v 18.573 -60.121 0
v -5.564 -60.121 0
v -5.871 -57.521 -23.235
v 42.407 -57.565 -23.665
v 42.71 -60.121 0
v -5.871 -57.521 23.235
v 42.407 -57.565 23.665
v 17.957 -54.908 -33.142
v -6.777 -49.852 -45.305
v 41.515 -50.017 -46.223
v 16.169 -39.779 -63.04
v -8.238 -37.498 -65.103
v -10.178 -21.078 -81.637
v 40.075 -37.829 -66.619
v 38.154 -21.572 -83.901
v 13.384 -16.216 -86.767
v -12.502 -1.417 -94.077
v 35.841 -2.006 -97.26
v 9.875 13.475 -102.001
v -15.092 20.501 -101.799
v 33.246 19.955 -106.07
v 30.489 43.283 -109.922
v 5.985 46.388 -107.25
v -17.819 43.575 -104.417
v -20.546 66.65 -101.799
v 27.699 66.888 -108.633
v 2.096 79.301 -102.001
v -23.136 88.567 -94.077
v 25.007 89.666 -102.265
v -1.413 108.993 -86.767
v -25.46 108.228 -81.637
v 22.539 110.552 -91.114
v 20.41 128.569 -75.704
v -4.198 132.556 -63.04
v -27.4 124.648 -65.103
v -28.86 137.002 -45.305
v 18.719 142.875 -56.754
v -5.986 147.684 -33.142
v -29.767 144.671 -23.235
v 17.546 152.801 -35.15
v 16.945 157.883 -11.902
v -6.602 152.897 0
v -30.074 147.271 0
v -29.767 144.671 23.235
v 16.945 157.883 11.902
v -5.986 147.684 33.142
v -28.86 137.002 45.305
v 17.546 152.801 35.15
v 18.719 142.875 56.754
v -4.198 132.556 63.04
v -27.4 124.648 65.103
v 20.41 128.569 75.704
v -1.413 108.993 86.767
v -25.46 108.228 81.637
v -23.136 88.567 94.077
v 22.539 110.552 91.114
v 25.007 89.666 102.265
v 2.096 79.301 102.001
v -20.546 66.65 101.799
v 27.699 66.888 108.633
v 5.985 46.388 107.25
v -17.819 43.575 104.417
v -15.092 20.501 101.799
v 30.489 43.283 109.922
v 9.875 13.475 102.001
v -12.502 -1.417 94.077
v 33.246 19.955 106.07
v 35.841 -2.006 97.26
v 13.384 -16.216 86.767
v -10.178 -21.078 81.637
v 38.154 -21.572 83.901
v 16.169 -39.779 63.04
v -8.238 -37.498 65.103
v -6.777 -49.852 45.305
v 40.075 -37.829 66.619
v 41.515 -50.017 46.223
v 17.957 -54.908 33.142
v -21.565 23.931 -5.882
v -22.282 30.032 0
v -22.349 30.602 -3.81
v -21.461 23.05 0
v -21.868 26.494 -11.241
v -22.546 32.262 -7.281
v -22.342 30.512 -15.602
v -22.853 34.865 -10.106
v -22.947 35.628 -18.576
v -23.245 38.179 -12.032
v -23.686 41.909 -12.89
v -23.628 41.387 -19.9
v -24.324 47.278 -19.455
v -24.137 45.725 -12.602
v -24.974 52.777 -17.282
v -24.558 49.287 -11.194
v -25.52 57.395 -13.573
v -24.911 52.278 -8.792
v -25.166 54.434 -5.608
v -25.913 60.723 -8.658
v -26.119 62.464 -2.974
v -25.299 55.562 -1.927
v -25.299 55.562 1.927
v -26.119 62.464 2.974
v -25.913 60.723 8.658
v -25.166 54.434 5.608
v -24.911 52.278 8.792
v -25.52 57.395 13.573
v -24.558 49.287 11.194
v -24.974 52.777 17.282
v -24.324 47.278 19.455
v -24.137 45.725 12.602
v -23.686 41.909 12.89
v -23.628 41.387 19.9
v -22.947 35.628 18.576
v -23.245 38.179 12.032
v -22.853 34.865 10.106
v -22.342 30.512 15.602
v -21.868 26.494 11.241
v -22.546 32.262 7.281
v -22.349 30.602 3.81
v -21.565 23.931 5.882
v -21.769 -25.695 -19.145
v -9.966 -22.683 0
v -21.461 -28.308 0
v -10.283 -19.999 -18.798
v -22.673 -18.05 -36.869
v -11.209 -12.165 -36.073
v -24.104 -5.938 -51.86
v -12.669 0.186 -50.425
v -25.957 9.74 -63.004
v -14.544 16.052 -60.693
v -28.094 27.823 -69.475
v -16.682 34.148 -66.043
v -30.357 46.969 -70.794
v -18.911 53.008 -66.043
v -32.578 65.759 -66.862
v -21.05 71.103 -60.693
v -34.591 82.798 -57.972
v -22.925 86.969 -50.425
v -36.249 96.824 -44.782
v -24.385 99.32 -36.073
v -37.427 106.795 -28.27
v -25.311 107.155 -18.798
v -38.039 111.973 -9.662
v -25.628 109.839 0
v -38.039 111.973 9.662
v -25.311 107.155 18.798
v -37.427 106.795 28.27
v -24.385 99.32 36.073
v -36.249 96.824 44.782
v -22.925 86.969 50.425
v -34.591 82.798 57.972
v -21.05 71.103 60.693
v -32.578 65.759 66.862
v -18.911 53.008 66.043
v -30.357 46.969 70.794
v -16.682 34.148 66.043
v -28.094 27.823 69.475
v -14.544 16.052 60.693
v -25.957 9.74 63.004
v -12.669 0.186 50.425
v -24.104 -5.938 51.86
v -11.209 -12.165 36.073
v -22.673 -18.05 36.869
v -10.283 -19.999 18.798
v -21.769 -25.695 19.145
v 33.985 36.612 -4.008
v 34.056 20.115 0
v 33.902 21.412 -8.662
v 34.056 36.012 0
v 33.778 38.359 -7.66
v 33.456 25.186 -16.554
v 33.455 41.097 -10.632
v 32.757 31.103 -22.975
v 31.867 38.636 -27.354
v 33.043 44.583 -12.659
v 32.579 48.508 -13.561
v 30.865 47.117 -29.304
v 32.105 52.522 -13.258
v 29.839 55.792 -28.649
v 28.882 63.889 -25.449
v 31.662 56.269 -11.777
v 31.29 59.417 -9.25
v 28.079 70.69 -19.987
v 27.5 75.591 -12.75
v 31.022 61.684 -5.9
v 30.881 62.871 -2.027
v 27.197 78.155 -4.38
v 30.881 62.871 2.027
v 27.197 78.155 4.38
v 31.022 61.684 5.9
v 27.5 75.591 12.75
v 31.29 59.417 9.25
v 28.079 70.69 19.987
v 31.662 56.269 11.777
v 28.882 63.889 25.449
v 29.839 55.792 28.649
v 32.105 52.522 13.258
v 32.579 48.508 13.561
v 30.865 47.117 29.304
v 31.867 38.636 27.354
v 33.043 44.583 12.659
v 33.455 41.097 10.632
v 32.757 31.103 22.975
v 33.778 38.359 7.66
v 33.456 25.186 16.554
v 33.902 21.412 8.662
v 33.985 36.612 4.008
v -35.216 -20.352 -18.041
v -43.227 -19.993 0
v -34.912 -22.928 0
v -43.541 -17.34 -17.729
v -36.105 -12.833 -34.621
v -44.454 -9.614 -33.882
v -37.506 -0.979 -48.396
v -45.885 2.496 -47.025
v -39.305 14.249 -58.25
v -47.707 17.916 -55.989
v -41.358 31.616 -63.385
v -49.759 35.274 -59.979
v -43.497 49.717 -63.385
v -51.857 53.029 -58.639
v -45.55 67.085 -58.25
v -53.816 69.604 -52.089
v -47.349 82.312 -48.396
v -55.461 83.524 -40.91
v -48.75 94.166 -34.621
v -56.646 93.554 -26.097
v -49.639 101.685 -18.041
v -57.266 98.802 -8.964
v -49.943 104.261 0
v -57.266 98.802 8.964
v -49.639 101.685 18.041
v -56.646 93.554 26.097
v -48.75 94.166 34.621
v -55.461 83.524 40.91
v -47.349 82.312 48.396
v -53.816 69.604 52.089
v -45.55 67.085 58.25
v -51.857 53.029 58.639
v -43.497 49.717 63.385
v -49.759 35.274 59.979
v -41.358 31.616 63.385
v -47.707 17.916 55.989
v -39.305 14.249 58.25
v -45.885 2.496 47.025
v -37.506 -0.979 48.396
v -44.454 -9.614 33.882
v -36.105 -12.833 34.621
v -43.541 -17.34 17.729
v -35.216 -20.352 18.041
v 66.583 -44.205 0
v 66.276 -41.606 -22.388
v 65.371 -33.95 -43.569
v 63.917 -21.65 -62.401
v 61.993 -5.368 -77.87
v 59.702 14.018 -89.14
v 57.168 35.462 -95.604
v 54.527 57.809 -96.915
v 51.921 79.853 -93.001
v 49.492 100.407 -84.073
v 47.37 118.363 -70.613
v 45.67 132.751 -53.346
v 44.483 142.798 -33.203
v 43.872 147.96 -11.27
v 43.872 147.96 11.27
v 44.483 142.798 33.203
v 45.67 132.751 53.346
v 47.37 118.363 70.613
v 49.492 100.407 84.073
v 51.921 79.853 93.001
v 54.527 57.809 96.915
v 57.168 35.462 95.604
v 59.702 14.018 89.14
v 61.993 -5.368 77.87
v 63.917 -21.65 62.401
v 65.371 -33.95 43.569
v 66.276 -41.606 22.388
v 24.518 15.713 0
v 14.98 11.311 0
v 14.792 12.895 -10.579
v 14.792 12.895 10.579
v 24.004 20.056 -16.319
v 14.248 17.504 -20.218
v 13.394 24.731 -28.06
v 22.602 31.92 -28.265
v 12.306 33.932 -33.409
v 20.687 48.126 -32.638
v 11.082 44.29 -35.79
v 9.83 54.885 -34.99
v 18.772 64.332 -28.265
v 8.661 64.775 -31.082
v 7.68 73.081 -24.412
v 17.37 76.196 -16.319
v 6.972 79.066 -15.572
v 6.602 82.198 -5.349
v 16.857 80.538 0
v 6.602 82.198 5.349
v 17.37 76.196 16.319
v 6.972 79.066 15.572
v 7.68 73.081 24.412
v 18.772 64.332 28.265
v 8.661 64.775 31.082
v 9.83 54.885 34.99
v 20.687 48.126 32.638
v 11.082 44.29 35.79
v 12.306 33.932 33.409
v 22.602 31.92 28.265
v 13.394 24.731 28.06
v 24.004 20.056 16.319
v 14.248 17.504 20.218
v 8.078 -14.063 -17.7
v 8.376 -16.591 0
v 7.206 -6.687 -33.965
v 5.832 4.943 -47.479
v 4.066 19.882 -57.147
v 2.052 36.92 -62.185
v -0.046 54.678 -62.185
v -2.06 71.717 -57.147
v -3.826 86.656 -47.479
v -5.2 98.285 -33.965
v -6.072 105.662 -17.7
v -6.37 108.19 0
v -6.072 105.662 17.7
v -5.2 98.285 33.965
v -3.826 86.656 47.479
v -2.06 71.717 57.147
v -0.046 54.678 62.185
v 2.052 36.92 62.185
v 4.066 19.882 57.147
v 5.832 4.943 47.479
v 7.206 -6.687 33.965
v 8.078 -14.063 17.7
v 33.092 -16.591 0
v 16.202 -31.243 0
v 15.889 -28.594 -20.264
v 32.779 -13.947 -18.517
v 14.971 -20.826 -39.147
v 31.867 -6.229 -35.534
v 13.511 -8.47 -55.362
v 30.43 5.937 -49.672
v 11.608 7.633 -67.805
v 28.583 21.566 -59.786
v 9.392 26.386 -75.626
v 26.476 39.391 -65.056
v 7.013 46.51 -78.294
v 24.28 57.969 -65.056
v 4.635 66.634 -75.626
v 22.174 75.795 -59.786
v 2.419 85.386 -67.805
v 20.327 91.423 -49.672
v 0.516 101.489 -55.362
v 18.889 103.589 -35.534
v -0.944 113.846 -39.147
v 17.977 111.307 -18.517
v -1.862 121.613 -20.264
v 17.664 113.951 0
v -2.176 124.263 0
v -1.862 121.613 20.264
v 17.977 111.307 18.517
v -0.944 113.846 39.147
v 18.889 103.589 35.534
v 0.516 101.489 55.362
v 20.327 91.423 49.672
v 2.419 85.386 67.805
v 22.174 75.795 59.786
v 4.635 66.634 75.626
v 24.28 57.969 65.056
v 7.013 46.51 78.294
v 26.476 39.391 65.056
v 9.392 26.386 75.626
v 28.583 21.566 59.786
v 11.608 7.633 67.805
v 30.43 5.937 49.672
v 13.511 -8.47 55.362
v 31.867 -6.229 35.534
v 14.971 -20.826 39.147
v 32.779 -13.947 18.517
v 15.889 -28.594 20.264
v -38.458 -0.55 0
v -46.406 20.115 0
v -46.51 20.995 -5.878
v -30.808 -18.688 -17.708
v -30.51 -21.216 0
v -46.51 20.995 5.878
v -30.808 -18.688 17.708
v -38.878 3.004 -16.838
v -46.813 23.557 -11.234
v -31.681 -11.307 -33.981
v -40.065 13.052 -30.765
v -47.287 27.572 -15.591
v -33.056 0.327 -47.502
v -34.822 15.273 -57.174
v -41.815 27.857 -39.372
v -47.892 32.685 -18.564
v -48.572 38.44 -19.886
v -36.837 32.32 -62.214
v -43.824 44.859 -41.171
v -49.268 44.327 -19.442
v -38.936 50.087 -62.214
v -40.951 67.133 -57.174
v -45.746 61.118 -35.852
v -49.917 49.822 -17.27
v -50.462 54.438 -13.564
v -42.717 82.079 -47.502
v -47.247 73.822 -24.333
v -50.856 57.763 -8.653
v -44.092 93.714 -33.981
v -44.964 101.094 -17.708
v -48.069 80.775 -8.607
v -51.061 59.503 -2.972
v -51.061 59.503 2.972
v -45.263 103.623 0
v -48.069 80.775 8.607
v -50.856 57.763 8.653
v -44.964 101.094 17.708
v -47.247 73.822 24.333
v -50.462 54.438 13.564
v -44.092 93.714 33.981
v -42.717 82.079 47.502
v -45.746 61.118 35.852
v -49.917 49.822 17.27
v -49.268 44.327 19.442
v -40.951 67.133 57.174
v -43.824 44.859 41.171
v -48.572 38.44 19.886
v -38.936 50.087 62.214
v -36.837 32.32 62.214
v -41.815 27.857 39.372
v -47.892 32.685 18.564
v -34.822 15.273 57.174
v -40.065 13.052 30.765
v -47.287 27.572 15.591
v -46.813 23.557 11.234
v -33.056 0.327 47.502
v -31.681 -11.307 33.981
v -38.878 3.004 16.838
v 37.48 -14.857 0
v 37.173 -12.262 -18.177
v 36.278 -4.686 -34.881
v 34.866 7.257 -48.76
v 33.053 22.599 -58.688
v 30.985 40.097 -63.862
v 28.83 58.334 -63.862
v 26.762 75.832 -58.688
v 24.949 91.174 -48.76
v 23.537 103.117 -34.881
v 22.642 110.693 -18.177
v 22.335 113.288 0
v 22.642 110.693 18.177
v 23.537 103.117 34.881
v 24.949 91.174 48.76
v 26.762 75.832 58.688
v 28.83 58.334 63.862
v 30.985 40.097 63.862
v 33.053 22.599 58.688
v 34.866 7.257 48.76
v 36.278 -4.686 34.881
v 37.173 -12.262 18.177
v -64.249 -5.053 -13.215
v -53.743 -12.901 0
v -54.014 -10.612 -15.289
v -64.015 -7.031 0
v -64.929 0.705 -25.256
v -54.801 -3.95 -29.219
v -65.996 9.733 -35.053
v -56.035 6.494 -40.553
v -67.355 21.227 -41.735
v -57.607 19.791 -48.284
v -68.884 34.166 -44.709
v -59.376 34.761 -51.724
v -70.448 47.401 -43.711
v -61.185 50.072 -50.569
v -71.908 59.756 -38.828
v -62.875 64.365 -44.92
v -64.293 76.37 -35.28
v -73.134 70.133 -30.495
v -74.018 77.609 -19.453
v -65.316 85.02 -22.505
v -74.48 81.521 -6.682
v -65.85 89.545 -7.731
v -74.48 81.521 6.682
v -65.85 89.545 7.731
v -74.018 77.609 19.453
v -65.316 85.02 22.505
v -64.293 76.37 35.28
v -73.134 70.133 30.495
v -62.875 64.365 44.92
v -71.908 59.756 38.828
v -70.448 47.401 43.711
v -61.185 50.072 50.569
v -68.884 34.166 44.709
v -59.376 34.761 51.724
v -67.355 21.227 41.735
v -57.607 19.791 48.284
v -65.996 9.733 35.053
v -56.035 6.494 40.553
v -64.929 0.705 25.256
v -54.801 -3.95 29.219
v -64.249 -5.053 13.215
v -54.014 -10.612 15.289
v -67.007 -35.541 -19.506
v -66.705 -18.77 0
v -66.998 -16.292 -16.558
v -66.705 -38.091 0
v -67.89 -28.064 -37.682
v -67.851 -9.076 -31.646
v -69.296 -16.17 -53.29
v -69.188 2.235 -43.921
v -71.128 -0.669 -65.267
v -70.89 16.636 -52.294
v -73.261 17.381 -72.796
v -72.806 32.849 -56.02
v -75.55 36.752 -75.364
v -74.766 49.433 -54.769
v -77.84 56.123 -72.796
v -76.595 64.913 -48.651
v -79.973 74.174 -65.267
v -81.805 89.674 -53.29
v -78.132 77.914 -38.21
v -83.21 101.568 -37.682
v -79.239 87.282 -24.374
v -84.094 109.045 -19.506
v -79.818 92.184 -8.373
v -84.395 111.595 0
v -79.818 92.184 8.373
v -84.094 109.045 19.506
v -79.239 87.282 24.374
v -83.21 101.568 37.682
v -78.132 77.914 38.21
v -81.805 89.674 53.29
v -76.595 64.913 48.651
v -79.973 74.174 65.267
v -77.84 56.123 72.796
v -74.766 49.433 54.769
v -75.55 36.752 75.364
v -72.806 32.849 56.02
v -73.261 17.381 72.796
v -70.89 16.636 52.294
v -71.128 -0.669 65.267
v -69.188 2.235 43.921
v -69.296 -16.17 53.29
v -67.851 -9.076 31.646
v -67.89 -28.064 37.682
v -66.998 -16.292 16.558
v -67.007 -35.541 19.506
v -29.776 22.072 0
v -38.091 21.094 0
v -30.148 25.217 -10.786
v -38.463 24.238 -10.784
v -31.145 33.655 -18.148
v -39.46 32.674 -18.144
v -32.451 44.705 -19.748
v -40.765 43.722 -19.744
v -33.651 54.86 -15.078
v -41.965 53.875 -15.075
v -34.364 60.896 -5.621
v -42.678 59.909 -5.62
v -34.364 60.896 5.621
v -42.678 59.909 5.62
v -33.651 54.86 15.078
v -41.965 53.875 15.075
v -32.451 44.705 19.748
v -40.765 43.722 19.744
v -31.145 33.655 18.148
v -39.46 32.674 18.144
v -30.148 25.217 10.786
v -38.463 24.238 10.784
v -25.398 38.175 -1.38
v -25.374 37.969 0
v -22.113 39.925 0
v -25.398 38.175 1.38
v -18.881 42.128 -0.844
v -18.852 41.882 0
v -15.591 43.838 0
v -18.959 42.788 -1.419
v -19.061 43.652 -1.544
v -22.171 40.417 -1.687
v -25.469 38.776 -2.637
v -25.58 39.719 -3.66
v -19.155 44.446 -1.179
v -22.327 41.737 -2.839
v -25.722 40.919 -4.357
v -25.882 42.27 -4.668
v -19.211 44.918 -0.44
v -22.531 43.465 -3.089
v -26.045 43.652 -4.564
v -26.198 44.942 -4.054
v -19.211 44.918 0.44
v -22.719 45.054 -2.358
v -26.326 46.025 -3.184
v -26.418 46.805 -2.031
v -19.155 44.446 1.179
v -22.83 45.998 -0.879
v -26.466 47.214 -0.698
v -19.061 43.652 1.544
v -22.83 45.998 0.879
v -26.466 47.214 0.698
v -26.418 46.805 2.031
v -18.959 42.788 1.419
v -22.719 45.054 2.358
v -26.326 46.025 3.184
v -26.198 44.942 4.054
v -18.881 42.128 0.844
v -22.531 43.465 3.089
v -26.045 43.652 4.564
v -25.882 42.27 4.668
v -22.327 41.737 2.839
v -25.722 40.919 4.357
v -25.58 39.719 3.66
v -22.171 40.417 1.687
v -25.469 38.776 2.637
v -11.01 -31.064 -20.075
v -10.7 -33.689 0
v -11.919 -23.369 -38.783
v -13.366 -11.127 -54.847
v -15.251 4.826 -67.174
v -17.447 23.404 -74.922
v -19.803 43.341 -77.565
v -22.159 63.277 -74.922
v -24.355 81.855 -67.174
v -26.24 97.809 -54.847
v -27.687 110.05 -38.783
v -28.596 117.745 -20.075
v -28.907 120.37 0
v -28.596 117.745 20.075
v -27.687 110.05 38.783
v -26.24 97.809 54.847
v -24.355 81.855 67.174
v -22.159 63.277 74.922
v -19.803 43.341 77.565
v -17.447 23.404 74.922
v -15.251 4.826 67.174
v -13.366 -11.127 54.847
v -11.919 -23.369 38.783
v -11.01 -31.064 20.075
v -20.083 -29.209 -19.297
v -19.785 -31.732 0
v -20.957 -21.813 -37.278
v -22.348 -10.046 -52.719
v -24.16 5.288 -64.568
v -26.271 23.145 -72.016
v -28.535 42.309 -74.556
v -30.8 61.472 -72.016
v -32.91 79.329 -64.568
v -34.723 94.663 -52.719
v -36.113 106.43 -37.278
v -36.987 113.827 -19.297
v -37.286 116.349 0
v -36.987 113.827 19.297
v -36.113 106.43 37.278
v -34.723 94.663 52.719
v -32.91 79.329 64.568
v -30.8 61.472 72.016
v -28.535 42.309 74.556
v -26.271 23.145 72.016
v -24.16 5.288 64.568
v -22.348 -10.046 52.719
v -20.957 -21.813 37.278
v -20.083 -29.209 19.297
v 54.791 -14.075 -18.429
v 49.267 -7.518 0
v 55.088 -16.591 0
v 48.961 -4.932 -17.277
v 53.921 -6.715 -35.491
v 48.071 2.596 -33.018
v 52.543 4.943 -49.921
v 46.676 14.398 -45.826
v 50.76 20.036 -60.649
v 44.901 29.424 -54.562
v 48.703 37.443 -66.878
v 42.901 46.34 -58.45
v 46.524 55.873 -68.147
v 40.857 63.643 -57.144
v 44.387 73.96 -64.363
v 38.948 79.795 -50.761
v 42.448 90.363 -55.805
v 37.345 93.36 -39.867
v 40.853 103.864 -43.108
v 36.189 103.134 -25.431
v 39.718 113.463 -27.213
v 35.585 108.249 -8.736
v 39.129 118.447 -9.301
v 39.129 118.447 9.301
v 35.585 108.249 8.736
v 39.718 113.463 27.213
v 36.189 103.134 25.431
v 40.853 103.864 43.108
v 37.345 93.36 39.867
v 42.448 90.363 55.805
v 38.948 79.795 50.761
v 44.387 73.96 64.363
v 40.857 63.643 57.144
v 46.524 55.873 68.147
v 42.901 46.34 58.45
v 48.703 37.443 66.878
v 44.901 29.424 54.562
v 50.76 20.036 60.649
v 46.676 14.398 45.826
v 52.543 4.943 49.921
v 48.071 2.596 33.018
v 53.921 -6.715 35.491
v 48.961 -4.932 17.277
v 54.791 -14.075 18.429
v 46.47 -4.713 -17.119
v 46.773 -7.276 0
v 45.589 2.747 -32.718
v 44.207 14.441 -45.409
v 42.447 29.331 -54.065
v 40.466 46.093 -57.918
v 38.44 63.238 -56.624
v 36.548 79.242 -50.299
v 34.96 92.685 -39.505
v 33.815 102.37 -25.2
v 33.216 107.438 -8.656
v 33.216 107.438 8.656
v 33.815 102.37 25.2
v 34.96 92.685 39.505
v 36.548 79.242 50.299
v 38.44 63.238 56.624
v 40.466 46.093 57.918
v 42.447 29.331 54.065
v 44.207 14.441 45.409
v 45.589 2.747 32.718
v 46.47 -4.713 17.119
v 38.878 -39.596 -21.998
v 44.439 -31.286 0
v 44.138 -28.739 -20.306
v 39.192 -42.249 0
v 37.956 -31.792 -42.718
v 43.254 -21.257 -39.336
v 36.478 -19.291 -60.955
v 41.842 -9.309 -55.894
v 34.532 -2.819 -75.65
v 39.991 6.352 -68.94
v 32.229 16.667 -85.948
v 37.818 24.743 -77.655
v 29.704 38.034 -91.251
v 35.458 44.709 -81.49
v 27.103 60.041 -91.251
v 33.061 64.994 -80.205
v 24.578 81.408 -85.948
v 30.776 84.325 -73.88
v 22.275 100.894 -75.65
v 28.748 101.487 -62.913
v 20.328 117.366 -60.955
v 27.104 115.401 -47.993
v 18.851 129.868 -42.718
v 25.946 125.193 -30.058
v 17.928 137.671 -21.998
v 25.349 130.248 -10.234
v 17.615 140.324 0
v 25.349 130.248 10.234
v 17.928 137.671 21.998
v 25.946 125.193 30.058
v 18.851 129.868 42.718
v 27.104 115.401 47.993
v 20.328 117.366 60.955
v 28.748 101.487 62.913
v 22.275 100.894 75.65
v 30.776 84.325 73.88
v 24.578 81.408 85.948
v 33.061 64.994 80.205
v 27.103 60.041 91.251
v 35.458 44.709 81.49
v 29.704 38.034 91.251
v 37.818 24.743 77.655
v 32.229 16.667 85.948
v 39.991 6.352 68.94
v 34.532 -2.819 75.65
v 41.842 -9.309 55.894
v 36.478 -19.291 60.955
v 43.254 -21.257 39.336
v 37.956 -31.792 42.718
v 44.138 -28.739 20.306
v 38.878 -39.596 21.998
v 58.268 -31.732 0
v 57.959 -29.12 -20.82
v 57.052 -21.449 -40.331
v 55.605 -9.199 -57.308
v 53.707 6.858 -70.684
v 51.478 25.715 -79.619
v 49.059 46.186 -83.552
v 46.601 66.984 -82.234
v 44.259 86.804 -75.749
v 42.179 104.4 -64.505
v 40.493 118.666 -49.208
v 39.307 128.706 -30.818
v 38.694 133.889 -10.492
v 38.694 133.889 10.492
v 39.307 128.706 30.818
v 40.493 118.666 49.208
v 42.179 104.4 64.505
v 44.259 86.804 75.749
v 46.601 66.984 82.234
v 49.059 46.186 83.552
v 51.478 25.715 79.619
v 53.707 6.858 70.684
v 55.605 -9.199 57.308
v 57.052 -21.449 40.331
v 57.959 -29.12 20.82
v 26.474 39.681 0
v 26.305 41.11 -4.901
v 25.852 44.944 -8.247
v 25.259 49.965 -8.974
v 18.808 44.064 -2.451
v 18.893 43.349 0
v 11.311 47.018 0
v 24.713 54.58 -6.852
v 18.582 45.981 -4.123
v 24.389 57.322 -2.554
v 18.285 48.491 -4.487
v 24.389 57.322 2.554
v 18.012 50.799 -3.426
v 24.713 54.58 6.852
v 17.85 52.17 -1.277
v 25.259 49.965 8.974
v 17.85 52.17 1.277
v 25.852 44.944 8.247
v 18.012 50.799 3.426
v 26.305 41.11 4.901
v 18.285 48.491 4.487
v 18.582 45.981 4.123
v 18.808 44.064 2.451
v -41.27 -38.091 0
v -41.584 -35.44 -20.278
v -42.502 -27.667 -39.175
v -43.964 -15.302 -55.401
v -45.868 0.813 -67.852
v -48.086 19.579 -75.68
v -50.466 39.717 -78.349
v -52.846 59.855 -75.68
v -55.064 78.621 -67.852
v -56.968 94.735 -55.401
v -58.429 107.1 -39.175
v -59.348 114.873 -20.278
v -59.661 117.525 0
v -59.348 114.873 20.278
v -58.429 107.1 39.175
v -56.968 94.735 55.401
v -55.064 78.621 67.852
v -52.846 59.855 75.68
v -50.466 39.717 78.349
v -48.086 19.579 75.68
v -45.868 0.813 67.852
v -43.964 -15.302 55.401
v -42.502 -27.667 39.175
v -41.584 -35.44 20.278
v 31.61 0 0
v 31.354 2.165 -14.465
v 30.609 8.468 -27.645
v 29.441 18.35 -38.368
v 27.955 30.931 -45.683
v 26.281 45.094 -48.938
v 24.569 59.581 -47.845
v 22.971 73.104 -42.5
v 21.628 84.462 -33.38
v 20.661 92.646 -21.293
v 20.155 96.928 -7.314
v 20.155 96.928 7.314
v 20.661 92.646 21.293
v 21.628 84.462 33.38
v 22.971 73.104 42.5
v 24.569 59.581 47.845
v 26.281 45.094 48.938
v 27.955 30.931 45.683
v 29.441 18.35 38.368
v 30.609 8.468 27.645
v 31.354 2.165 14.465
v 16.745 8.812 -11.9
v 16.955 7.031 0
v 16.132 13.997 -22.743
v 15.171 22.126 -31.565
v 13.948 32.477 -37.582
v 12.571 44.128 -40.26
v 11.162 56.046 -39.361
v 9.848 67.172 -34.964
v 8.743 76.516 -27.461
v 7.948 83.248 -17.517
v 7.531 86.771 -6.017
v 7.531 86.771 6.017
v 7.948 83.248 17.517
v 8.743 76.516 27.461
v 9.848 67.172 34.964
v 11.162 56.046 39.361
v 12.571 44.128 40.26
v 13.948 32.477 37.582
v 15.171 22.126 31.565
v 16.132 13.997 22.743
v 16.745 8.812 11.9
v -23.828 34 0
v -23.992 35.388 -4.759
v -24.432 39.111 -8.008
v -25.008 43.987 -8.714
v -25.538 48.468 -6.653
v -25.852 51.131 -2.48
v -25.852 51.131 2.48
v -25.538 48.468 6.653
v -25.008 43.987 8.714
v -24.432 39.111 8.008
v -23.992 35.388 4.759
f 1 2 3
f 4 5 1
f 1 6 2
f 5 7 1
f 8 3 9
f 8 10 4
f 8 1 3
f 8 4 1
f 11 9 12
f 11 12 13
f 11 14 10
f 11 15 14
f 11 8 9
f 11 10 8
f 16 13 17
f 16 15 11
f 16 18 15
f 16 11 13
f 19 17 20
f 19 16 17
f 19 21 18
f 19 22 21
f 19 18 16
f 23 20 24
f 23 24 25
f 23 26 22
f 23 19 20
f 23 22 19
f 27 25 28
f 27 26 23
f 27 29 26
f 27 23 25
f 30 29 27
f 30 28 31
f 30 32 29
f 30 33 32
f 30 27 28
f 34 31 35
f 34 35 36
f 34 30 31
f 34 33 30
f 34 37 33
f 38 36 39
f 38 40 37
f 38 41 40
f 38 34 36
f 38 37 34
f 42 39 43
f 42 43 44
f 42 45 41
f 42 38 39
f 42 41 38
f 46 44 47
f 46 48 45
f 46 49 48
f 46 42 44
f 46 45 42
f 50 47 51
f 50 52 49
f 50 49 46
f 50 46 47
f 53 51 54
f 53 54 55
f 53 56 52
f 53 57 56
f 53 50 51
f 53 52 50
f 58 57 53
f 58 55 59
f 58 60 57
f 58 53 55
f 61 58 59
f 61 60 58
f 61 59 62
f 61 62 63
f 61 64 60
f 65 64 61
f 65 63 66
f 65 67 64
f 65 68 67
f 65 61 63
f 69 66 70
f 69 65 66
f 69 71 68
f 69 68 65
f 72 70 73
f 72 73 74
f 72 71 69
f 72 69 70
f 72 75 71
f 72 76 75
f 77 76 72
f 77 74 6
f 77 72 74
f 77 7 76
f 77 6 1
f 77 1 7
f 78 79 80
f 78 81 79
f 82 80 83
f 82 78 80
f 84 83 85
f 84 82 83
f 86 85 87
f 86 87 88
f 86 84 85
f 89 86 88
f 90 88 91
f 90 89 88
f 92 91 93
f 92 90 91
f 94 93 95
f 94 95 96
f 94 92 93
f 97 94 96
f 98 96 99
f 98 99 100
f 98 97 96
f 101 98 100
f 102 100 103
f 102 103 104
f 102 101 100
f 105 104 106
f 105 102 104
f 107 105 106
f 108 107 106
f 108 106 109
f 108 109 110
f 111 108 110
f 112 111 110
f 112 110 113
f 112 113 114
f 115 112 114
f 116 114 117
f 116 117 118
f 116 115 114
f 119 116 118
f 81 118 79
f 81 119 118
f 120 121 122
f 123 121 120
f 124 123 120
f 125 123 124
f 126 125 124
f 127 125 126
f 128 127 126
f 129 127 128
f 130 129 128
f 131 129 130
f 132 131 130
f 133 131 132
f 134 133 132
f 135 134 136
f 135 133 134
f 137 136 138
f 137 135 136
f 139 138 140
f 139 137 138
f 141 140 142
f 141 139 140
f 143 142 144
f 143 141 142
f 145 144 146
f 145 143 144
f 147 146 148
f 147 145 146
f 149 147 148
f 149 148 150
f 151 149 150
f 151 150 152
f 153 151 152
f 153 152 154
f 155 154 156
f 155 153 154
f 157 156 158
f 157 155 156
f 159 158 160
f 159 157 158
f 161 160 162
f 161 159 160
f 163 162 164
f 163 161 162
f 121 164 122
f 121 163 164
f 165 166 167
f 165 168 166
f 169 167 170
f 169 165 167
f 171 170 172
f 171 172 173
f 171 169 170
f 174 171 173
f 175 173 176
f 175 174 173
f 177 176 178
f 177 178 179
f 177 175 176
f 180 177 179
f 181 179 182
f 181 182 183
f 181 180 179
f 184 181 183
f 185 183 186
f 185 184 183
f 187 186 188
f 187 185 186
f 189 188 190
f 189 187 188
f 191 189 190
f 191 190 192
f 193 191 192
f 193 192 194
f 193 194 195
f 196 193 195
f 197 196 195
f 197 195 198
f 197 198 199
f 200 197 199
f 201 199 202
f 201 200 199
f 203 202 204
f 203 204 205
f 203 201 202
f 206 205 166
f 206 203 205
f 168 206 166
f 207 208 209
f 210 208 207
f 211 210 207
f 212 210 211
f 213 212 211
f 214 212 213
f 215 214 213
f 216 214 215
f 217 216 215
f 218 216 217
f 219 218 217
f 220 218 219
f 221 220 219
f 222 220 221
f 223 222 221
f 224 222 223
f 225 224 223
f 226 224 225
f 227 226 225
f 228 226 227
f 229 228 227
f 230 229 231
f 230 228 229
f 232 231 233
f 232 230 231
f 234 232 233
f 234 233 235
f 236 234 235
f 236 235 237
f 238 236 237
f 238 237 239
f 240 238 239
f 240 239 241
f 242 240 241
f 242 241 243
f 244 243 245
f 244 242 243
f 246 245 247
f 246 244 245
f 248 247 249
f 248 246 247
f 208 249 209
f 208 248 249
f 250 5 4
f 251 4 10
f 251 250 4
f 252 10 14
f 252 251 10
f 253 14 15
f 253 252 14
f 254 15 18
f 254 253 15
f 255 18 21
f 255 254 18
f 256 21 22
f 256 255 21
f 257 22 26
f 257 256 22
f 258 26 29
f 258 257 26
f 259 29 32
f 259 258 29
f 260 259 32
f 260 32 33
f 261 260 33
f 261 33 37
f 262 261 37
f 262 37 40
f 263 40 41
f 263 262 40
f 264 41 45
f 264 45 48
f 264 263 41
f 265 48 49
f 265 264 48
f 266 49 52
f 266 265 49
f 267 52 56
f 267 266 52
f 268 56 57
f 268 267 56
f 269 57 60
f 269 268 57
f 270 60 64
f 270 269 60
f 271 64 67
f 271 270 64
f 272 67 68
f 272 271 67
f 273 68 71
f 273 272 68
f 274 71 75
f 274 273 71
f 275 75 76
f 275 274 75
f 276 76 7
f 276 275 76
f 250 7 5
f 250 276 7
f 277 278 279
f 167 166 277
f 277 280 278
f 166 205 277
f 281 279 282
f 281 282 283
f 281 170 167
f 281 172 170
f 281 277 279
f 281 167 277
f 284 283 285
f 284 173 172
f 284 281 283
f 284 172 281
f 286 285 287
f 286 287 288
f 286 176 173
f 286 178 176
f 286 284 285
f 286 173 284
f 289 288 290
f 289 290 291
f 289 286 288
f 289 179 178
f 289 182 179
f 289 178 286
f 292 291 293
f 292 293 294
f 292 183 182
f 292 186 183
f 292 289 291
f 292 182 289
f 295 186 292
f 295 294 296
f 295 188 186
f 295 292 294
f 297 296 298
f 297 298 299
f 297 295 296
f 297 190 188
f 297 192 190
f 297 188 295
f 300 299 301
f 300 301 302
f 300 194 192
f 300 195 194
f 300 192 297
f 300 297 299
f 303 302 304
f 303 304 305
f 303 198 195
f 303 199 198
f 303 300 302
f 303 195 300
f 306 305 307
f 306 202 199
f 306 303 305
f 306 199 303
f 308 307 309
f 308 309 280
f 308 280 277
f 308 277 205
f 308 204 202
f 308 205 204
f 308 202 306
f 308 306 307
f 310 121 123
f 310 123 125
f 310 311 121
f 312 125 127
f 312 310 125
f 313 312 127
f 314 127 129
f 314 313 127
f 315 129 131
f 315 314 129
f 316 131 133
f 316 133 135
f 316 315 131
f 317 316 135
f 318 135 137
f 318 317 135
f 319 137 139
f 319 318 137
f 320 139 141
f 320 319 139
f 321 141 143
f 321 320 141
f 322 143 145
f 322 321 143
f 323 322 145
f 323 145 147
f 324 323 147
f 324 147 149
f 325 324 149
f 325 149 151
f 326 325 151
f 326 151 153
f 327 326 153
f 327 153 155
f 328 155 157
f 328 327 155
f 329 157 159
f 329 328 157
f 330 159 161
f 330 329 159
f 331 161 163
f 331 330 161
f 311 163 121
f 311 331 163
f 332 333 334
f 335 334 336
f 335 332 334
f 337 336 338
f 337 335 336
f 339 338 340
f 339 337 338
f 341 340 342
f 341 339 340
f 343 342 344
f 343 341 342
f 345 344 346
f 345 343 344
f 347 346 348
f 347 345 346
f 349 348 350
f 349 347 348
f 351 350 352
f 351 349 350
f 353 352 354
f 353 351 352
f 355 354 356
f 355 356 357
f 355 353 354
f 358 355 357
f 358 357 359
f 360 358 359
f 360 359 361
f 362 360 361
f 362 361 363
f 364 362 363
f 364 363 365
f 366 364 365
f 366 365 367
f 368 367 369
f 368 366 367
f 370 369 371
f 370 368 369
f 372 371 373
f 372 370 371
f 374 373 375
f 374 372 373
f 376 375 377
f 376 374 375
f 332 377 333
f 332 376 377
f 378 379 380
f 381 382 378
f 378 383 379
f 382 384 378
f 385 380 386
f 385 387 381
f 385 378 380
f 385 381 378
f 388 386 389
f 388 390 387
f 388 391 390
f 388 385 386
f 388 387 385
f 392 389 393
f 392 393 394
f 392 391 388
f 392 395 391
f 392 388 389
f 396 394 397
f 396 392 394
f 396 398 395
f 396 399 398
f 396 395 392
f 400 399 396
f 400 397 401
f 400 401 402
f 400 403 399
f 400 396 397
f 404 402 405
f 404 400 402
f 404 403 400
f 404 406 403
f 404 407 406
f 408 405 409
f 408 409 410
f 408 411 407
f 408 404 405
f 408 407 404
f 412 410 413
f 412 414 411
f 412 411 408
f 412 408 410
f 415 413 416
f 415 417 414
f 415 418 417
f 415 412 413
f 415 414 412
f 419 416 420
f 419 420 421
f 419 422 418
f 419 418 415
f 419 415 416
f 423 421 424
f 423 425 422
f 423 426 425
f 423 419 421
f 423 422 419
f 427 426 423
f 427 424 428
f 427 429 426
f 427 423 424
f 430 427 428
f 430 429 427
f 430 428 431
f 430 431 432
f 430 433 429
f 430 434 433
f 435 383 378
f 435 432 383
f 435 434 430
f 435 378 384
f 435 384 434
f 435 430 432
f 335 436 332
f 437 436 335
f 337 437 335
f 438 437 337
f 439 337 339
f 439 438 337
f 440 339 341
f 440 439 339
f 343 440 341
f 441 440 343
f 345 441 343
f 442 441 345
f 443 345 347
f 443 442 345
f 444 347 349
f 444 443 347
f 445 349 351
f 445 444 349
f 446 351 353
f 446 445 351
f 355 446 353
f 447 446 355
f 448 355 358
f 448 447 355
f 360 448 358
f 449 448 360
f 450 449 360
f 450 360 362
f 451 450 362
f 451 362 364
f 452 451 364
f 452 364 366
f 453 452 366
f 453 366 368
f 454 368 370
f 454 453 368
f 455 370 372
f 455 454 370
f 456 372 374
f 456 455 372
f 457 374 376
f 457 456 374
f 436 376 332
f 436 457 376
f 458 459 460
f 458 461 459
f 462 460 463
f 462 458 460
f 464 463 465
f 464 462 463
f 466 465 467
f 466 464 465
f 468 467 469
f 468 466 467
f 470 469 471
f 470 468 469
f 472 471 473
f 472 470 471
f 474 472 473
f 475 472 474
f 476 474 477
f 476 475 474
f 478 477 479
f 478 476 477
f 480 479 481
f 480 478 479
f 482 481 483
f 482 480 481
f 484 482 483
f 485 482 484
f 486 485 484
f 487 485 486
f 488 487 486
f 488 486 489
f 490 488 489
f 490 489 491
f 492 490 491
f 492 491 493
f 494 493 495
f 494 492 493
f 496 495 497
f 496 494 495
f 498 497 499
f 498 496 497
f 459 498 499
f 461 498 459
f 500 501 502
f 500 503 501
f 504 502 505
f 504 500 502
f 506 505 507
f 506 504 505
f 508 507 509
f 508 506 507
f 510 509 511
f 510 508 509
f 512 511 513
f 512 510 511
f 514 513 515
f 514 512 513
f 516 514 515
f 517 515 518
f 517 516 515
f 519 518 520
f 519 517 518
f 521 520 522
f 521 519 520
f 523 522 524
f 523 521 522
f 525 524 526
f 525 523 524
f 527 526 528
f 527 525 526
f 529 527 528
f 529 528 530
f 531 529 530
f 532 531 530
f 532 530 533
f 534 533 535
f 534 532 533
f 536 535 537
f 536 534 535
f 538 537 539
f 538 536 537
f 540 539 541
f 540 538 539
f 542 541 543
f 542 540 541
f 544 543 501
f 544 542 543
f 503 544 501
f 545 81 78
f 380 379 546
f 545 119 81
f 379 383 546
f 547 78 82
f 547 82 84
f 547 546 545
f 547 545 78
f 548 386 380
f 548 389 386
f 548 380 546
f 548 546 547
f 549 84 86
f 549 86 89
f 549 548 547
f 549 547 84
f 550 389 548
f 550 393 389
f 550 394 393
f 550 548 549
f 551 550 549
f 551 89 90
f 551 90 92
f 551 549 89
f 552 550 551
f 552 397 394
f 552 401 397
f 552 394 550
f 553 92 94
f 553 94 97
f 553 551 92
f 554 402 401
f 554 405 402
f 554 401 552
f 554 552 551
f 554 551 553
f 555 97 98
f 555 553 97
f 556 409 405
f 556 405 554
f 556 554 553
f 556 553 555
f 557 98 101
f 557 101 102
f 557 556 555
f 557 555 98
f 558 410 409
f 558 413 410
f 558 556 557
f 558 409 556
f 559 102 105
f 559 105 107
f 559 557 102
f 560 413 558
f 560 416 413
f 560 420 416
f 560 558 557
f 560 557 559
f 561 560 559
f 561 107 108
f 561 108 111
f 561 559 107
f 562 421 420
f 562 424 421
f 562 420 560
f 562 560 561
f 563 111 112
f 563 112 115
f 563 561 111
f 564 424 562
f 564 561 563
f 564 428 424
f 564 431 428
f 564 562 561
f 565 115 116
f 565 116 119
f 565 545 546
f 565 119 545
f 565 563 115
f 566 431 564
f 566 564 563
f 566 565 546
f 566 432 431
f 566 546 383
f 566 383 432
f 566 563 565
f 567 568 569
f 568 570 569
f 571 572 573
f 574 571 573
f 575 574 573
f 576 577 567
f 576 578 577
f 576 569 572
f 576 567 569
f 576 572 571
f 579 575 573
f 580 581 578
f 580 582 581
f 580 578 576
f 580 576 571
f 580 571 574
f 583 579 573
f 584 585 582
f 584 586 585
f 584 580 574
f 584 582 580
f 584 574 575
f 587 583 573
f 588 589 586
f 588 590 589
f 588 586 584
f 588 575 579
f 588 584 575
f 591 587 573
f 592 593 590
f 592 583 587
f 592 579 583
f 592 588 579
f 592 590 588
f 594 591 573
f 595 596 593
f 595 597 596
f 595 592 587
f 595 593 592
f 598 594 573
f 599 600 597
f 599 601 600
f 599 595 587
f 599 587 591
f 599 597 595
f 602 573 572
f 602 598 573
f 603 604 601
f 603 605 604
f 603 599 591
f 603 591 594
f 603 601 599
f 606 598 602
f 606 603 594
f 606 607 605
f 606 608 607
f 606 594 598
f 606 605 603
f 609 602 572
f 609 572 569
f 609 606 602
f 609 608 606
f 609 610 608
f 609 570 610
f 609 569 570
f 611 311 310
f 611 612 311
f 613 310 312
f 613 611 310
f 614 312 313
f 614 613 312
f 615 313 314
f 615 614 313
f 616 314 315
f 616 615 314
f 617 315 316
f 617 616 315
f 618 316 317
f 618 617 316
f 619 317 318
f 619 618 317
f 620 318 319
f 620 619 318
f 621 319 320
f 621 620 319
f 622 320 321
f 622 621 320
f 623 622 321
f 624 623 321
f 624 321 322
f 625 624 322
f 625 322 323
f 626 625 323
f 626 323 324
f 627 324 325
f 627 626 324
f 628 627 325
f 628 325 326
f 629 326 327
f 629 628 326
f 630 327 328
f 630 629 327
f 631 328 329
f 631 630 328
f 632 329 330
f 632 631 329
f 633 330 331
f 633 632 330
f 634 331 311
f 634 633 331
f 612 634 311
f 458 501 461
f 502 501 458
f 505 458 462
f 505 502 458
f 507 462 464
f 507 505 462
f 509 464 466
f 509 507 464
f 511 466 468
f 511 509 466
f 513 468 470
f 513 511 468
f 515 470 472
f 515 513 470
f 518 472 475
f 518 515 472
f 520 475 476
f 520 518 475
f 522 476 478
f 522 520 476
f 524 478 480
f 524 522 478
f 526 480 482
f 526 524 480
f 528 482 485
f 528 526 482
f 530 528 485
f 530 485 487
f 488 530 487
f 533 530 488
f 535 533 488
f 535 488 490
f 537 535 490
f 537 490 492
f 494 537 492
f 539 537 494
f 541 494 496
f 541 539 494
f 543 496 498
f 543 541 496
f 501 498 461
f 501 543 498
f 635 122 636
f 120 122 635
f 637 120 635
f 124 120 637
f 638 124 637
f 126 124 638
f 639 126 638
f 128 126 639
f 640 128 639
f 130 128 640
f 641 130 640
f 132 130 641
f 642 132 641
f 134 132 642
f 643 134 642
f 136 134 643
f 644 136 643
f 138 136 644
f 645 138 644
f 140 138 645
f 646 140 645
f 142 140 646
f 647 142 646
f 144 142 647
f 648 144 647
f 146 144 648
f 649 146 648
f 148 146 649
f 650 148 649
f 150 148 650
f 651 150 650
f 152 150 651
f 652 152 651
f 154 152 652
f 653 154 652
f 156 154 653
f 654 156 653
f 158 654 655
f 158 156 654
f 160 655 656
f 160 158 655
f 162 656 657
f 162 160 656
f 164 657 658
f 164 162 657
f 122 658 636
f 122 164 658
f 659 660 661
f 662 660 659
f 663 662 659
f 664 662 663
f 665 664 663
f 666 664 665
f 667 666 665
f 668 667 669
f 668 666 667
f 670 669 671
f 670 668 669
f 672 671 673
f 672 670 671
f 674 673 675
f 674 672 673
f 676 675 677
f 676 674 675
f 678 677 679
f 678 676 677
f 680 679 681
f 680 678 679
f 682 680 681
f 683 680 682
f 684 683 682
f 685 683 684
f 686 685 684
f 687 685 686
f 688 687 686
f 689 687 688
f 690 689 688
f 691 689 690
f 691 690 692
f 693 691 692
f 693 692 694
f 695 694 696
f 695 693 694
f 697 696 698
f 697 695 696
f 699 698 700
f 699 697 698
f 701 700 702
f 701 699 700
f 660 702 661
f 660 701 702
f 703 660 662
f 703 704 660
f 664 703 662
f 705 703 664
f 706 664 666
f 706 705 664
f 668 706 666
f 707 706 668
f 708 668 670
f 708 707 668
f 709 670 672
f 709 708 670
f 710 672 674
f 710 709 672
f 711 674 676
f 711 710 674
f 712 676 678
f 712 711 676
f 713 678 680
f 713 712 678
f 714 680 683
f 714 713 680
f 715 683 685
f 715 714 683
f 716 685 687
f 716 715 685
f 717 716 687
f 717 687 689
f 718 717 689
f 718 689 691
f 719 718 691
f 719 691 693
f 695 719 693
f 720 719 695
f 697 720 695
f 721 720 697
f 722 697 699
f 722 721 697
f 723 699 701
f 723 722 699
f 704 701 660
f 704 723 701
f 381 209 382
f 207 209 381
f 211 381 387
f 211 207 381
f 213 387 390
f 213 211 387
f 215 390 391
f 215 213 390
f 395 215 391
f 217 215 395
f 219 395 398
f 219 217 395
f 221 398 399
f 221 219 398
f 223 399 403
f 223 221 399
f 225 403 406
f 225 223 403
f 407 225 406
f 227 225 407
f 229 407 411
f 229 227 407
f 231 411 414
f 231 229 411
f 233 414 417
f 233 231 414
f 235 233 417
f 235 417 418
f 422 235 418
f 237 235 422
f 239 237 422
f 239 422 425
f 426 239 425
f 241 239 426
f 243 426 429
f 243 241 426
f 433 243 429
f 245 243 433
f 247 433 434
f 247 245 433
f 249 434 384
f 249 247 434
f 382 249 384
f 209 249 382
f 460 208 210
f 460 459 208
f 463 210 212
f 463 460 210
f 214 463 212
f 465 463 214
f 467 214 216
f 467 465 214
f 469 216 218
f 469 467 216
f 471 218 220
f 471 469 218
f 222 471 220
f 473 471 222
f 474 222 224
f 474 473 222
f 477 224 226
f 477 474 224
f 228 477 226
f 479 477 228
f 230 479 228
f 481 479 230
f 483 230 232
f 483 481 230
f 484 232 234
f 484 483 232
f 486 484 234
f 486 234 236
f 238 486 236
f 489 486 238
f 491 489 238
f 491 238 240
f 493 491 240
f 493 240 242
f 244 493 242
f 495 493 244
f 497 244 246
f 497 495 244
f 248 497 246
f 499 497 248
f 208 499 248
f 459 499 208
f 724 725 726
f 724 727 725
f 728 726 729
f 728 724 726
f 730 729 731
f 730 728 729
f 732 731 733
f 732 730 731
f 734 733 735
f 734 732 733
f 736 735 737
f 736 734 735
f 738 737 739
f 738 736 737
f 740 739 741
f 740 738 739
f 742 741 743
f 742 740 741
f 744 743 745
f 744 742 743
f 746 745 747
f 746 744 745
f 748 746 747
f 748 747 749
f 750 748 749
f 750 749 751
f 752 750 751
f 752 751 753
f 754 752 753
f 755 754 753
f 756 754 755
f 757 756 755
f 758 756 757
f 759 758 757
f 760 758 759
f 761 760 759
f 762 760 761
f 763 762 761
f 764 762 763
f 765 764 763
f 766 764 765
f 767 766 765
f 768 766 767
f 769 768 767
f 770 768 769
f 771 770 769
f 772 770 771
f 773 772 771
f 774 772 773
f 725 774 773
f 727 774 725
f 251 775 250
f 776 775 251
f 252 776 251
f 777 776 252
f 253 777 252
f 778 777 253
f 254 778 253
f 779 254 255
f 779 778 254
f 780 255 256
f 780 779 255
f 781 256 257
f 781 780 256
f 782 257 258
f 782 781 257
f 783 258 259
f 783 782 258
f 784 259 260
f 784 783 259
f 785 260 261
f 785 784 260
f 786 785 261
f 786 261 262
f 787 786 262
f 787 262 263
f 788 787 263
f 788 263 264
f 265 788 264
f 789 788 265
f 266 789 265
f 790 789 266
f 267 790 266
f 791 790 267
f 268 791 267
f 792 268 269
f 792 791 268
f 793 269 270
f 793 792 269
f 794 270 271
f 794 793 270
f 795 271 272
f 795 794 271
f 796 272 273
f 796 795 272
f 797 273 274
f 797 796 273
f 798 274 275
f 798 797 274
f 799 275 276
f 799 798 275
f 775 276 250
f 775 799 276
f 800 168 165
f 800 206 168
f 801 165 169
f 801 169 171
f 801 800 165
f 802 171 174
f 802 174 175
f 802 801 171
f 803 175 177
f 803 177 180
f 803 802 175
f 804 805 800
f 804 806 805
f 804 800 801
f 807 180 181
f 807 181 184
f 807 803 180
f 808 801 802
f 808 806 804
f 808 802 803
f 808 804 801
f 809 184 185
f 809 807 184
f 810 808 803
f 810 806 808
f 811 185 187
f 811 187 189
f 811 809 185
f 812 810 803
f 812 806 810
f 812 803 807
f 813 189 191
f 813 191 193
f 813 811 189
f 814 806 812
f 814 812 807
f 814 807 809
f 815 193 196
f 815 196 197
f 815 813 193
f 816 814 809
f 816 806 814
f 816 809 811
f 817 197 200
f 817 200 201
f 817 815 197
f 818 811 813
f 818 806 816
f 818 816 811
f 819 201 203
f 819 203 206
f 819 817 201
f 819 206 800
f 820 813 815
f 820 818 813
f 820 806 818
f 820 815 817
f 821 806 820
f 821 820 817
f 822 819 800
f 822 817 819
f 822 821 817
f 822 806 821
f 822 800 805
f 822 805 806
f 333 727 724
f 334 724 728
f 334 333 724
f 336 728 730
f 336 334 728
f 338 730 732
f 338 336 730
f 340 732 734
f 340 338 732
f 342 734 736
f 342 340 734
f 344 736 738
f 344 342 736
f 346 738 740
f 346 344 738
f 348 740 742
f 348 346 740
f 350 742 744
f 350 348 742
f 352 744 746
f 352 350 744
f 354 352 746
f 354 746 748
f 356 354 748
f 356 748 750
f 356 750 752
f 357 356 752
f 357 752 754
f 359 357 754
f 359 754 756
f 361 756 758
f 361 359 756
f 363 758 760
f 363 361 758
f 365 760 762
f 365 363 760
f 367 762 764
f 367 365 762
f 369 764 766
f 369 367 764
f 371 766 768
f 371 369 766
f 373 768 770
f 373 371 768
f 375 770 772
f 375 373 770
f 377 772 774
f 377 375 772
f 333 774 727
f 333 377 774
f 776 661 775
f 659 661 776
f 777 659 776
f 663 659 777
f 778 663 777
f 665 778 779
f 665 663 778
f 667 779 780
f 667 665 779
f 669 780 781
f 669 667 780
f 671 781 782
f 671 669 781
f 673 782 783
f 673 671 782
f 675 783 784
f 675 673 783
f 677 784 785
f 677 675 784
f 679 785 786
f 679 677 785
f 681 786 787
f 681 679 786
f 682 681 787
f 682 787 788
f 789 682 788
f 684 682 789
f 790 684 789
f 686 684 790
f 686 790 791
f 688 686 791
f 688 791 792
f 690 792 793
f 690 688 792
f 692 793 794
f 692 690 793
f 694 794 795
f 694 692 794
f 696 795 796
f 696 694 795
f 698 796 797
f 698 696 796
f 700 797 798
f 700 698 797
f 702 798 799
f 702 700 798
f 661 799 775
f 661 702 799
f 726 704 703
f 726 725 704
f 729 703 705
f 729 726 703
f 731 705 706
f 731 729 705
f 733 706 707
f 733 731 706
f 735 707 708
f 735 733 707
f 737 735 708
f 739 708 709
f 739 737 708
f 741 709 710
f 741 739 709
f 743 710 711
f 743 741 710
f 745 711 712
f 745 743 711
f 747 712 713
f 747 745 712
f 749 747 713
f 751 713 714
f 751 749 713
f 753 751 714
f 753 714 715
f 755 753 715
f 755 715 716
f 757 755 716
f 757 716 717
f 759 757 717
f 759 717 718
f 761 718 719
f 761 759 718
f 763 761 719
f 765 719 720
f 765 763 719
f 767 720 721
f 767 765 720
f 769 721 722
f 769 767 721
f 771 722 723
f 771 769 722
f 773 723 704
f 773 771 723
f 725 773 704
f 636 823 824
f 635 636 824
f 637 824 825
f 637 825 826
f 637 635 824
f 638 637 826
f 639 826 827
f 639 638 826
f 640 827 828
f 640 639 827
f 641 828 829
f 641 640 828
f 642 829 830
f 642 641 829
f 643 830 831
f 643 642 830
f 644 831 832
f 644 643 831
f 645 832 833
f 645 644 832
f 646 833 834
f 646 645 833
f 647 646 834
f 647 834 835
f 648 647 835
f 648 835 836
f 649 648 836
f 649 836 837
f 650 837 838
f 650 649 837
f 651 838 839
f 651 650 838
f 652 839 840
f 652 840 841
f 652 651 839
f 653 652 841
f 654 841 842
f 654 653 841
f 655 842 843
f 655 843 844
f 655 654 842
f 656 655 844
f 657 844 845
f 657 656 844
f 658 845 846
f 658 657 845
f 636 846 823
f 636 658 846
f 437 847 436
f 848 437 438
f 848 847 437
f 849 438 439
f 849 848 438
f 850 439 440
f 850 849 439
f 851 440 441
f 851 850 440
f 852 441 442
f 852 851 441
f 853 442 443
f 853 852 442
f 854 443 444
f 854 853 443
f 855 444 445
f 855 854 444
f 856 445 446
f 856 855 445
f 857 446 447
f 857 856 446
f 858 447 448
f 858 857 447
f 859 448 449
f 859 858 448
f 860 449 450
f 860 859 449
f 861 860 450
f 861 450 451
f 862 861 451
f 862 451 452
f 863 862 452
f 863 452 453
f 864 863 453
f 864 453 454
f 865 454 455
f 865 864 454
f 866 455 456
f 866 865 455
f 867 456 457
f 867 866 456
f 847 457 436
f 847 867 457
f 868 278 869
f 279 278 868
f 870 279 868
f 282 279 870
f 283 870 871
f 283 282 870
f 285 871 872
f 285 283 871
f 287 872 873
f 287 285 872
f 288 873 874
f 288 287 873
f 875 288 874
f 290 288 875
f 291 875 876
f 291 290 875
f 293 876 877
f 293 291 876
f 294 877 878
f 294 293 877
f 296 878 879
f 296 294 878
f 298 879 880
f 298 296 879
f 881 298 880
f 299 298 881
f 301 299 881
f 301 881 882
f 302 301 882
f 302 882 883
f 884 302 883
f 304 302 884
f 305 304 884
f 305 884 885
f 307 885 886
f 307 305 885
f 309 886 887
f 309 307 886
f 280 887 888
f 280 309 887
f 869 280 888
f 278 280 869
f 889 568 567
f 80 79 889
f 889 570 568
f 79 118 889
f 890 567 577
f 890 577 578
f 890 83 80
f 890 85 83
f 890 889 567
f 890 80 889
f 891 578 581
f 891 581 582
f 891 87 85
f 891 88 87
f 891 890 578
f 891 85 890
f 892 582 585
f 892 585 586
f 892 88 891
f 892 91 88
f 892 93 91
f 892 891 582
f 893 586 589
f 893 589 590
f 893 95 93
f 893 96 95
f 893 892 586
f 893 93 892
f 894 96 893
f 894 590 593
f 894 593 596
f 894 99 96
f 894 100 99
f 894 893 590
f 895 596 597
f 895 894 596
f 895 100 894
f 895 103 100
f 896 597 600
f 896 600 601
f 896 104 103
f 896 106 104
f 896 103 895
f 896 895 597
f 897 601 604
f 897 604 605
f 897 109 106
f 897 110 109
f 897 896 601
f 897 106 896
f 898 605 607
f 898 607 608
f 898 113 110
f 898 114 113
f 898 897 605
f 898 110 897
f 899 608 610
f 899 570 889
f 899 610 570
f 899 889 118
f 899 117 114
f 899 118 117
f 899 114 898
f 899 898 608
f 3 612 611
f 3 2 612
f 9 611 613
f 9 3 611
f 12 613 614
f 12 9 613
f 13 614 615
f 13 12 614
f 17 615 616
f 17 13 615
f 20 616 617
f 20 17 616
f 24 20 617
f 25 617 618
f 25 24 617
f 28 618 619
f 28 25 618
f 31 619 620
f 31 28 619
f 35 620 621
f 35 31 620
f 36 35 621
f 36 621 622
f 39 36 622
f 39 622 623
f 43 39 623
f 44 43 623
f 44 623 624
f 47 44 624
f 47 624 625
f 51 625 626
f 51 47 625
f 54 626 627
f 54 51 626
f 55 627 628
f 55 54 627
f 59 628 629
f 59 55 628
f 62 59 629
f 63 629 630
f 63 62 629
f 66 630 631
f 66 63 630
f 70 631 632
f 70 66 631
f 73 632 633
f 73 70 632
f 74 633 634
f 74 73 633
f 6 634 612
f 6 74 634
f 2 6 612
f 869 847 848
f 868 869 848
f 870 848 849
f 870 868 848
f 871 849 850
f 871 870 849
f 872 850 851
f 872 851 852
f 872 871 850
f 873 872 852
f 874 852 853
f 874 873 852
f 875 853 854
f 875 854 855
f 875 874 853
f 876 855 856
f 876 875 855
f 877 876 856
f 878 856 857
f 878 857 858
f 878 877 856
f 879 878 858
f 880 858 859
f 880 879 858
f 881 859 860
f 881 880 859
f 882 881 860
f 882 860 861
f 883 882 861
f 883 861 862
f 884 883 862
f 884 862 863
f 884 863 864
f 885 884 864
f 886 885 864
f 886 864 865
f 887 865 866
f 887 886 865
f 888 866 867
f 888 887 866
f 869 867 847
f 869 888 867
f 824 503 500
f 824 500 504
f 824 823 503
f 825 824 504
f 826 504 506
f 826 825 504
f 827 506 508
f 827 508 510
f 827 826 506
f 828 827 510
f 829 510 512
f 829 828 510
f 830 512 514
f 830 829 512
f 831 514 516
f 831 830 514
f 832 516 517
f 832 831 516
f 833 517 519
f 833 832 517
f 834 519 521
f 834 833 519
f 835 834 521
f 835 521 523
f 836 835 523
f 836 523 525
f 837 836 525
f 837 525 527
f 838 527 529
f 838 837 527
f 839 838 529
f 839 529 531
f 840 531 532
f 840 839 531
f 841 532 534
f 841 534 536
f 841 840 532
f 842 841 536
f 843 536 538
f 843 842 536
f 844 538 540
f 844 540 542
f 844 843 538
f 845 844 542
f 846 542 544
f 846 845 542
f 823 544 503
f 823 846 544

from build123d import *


with BuildPart() as f1:
    # F0 (on Top) → F1 (revolve)
    with BuildSketch(Plane.XY):
        Polygon((-46.406250447, 20.1154891402), (-30.5095128715, -21.2160330266), (-34.9116884172, -22.9279901832), (-43.2269051671, -19.9932083488), (-53.7432096899, -12.9008162767), (-64.0149489045, -7.0312502794), (-66.7051672935, -18.7703818083), (-66.7051672935, -38.0910336971), (-41.2703827024, -38.0910336971), (-19.7850654535, -31.732339412), (-21.4605983347, -28.308423236), (-9.9660325795, -22.6834248751), (8.3763608709, -16.5907324904), (-10.6997303665, -33.6888581514), (-5.5638612248, -60.1207125871), (15.9578826278, -60.1207125871), (42.7095489145, -60.1207125871), (66.5828809142, -44.2051626742), (58.2676678896, -31.732339412), (55.0883151591, -16.5907324904), (49.2665074484, -7.5181558132), (46.7730984092, -7.2758155875), (44.4394518833, -31.2864202052), (39.1915775836, -42.2486439347), (16.2024479359, -31.2432069331), (33.0919572228, -16.5907324904), (37.4796167016, -14.8573378101), (31.6100567579, 0), (16.9552299565, 7.0306546103), (14.9796204641, 11.3111417741), (34.0557061136, 20.1154891402), (34.0557061136, 36.0122285783), (11.3111417741, 47.0176674426), (-15.5910328031, 43.8383184373), (-25.3736432642, 37.9687510431), (-22.2819369673, 30.0316486084), (-21.4605983347, 23.0502728373), align=None)
    revolve(axis=Axis((-2.1399455145, 45.4279929399, 0), (0.9930888363, 0.1173650849, 0)))


solid = f1.part
